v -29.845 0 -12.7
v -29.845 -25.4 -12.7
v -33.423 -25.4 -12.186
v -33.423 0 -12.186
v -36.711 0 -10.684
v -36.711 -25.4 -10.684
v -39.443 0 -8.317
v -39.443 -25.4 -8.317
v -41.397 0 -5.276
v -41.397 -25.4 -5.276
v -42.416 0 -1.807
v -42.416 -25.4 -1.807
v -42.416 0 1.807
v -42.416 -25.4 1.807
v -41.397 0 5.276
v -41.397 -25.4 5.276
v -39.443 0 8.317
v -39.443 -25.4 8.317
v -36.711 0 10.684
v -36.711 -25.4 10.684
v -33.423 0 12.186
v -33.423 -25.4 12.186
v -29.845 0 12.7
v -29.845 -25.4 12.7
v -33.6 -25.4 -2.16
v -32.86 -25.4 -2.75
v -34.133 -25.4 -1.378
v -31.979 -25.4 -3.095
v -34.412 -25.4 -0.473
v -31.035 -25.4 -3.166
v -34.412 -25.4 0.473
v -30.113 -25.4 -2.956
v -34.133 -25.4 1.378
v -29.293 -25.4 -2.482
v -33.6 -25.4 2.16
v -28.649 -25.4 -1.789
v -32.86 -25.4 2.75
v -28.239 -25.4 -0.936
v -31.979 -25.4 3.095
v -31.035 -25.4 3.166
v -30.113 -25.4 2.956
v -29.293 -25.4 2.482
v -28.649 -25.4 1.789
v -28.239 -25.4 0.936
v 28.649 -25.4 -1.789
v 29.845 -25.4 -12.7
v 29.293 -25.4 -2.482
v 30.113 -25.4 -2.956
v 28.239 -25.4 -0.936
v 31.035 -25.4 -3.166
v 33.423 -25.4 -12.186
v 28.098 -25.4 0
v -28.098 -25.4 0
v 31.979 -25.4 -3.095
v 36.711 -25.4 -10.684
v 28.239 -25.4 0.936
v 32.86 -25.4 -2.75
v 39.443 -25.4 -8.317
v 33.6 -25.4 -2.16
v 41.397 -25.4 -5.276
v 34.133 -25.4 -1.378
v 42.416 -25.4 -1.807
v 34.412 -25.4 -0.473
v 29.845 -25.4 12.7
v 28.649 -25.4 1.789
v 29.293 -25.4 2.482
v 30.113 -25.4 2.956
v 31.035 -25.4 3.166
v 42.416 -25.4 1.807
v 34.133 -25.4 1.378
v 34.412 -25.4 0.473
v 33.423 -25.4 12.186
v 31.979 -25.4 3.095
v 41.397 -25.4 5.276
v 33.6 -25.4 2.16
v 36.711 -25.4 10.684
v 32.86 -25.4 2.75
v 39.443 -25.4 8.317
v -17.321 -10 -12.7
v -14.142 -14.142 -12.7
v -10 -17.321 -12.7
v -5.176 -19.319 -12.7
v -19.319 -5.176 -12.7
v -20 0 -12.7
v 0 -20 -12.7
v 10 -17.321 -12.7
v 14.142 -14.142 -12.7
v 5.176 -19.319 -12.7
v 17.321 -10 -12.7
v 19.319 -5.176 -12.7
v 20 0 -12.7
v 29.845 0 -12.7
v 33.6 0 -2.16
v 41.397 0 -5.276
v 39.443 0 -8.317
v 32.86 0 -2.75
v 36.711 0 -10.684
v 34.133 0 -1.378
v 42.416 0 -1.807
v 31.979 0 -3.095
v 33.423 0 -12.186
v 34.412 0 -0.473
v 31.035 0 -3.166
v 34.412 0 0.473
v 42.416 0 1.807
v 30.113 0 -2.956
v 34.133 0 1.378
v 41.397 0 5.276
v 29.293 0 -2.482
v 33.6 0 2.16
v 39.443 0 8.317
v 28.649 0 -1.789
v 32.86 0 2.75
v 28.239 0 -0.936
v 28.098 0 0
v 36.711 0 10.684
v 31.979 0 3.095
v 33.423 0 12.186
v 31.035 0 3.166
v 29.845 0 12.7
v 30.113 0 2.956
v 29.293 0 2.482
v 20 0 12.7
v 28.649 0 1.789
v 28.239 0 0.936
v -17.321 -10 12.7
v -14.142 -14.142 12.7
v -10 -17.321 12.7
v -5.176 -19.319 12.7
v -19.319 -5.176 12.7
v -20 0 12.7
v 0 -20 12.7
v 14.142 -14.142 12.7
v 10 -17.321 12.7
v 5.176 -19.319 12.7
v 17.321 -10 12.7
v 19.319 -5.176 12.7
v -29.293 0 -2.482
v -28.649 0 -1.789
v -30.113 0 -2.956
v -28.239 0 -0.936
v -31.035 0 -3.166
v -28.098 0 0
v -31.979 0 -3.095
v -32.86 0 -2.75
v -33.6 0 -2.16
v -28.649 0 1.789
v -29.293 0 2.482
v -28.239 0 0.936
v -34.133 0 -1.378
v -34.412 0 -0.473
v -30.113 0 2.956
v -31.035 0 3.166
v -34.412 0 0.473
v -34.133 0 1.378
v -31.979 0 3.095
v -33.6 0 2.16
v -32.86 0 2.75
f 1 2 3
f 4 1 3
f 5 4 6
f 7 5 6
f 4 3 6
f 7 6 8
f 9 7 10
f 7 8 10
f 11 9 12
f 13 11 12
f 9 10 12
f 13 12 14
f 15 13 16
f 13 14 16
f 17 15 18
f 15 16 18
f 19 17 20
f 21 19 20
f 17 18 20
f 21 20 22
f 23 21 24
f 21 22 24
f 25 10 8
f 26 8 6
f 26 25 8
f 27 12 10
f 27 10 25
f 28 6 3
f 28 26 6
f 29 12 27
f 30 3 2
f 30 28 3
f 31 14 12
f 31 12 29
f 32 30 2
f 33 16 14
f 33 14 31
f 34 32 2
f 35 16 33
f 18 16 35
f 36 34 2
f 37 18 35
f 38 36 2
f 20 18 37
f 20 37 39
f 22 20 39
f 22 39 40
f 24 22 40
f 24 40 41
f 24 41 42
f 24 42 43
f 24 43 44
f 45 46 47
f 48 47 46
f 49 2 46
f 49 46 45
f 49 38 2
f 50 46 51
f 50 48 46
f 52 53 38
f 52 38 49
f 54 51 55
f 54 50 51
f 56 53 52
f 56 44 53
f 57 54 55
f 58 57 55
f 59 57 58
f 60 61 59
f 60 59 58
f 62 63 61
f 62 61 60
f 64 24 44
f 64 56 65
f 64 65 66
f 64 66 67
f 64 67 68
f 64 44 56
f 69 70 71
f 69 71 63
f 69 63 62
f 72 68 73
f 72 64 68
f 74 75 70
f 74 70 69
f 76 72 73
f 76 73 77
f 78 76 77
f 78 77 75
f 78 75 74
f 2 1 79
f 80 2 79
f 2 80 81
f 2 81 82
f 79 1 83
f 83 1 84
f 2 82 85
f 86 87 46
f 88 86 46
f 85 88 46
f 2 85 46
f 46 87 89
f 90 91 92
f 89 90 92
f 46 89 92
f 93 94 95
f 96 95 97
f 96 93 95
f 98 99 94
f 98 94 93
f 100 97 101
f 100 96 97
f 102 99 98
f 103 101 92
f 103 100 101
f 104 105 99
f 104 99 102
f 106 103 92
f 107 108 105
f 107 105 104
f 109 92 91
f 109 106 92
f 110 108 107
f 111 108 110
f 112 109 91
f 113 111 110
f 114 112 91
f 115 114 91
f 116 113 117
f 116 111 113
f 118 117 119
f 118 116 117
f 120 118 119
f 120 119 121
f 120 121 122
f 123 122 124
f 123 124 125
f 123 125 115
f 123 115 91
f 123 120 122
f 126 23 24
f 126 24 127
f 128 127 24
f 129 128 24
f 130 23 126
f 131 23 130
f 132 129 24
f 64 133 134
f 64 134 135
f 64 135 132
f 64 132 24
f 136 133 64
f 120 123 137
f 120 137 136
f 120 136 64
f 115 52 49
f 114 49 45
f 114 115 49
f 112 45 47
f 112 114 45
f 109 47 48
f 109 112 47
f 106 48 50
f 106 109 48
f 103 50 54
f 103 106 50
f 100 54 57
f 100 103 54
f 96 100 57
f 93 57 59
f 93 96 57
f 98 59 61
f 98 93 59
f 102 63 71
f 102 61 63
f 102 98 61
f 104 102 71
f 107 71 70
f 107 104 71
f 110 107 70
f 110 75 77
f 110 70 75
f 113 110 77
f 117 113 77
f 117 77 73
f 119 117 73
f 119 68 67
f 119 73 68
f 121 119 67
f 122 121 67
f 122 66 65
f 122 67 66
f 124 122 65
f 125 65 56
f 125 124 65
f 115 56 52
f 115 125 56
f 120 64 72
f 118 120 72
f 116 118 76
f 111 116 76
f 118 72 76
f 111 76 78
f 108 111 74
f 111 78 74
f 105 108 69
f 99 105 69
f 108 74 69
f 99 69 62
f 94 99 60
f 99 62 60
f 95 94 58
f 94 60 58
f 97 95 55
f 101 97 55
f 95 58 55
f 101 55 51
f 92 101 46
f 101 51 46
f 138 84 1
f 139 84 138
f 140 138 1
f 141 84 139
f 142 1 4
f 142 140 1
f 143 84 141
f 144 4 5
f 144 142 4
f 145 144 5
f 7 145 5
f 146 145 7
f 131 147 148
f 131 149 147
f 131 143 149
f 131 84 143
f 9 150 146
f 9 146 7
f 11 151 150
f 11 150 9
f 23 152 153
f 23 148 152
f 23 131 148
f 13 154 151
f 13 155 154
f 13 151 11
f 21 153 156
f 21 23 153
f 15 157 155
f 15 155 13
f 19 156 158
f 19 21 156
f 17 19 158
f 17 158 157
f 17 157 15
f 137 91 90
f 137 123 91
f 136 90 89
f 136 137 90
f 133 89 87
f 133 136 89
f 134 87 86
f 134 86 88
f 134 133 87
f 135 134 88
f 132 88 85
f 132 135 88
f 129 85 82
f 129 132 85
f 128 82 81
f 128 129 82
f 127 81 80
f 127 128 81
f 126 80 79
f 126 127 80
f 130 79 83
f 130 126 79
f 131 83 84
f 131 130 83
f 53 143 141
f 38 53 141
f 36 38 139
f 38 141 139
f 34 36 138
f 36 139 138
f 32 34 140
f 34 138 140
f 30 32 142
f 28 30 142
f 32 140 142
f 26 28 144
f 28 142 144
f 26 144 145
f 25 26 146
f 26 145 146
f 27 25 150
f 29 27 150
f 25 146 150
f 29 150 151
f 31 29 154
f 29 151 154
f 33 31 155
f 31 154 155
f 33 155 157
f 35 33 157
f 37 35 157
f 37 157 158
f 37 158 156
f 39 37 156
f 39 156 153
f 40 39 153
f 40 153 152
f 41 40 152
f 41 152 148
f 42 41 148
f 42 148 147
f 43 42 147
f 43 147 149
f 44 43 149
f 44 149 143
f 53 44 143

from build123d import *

# Parameters (mm, degrees)
BOSS_EXTRUDE1_DEPTH = 12.7
SKETCH2_R           = 3.175
CUT_EXTRUDE1_DEPTH  = 26.4
SKETCH3_OUTSIDE_W   = 105.562
SKETCH3_OUTSIDE_H   = 45.872
CUT_EXTRUDE4_DEPTH  = 25.4


with BuildPart() as part:
    # Sketch1 → Boss-Extrude1 (new body, symmetric)
    with BuildSketch(Plane.XY):
        with BuildLine():
            Line((-20, 0), (-42.545, 0))
            Line((-42.545, 0), (-42.545, -25.4))
            Line((-42.545, -25.4), (42.545, -25.4))
            Line((42.545, -25.4), (42.545, 0))
            Line((42.545, 0), (20, 0))
            ThreePointArc((20, 0), (0, -20), (-20, 0))
        make_face()
    extrude(amount=BOSS_EXTRUDE1_DEPTH, both=True)

    # Sketch2 → Cut-Extrude1 (cut, through all)
    with BuildSketch(Plane(origin=(0, 0, 0), x_dir=(1, 0, 0), z_dir=(0, 1, 0))):
        with Locations((-31.2725, 0)):
            Circle(SKETCH2_R)
    cut_extrude1 = extrude(amount=-CUT_EXTRUDE1_DEPTH, mode=Mode.SUBTRACT)

    # Mirror1: Cut-Extrude1 across plane
    add(cut_extrude1.mirror(Plane(origin=(0, 0, 0), x_dir=(0, 0, 1), z_dir=(1, 0, 0))), mode=Mode.SUBTRACT)

    # Sketch3 outside → Cut-Extrude4 (cut)
    with BuildSketch(Plane.XZ.offset(25.4)):
        Rectangle(SKETCH3_OUTSIDE_W, SKETCH3_OUTSIDE_H)
        with BuildLine():
            Line((-29.845, 12.7), (29.845, 12.7))
            ThreePointArc((29.845, 12.7), (42.545, 0), (29.845, -12.7))
            Line((29.845, -12.7), (-29.845, -12.7))
            ThreePointArc((-29.845, -12.7), (-42.545, 0), (-29.845, 12.7))
        make_face(mode=Mode.SUBTRACT)
    extrude(amount=-CUT_EXTRUDE4_DEPTH, mode=Mode.SUBTRACT)


solid = part.part
